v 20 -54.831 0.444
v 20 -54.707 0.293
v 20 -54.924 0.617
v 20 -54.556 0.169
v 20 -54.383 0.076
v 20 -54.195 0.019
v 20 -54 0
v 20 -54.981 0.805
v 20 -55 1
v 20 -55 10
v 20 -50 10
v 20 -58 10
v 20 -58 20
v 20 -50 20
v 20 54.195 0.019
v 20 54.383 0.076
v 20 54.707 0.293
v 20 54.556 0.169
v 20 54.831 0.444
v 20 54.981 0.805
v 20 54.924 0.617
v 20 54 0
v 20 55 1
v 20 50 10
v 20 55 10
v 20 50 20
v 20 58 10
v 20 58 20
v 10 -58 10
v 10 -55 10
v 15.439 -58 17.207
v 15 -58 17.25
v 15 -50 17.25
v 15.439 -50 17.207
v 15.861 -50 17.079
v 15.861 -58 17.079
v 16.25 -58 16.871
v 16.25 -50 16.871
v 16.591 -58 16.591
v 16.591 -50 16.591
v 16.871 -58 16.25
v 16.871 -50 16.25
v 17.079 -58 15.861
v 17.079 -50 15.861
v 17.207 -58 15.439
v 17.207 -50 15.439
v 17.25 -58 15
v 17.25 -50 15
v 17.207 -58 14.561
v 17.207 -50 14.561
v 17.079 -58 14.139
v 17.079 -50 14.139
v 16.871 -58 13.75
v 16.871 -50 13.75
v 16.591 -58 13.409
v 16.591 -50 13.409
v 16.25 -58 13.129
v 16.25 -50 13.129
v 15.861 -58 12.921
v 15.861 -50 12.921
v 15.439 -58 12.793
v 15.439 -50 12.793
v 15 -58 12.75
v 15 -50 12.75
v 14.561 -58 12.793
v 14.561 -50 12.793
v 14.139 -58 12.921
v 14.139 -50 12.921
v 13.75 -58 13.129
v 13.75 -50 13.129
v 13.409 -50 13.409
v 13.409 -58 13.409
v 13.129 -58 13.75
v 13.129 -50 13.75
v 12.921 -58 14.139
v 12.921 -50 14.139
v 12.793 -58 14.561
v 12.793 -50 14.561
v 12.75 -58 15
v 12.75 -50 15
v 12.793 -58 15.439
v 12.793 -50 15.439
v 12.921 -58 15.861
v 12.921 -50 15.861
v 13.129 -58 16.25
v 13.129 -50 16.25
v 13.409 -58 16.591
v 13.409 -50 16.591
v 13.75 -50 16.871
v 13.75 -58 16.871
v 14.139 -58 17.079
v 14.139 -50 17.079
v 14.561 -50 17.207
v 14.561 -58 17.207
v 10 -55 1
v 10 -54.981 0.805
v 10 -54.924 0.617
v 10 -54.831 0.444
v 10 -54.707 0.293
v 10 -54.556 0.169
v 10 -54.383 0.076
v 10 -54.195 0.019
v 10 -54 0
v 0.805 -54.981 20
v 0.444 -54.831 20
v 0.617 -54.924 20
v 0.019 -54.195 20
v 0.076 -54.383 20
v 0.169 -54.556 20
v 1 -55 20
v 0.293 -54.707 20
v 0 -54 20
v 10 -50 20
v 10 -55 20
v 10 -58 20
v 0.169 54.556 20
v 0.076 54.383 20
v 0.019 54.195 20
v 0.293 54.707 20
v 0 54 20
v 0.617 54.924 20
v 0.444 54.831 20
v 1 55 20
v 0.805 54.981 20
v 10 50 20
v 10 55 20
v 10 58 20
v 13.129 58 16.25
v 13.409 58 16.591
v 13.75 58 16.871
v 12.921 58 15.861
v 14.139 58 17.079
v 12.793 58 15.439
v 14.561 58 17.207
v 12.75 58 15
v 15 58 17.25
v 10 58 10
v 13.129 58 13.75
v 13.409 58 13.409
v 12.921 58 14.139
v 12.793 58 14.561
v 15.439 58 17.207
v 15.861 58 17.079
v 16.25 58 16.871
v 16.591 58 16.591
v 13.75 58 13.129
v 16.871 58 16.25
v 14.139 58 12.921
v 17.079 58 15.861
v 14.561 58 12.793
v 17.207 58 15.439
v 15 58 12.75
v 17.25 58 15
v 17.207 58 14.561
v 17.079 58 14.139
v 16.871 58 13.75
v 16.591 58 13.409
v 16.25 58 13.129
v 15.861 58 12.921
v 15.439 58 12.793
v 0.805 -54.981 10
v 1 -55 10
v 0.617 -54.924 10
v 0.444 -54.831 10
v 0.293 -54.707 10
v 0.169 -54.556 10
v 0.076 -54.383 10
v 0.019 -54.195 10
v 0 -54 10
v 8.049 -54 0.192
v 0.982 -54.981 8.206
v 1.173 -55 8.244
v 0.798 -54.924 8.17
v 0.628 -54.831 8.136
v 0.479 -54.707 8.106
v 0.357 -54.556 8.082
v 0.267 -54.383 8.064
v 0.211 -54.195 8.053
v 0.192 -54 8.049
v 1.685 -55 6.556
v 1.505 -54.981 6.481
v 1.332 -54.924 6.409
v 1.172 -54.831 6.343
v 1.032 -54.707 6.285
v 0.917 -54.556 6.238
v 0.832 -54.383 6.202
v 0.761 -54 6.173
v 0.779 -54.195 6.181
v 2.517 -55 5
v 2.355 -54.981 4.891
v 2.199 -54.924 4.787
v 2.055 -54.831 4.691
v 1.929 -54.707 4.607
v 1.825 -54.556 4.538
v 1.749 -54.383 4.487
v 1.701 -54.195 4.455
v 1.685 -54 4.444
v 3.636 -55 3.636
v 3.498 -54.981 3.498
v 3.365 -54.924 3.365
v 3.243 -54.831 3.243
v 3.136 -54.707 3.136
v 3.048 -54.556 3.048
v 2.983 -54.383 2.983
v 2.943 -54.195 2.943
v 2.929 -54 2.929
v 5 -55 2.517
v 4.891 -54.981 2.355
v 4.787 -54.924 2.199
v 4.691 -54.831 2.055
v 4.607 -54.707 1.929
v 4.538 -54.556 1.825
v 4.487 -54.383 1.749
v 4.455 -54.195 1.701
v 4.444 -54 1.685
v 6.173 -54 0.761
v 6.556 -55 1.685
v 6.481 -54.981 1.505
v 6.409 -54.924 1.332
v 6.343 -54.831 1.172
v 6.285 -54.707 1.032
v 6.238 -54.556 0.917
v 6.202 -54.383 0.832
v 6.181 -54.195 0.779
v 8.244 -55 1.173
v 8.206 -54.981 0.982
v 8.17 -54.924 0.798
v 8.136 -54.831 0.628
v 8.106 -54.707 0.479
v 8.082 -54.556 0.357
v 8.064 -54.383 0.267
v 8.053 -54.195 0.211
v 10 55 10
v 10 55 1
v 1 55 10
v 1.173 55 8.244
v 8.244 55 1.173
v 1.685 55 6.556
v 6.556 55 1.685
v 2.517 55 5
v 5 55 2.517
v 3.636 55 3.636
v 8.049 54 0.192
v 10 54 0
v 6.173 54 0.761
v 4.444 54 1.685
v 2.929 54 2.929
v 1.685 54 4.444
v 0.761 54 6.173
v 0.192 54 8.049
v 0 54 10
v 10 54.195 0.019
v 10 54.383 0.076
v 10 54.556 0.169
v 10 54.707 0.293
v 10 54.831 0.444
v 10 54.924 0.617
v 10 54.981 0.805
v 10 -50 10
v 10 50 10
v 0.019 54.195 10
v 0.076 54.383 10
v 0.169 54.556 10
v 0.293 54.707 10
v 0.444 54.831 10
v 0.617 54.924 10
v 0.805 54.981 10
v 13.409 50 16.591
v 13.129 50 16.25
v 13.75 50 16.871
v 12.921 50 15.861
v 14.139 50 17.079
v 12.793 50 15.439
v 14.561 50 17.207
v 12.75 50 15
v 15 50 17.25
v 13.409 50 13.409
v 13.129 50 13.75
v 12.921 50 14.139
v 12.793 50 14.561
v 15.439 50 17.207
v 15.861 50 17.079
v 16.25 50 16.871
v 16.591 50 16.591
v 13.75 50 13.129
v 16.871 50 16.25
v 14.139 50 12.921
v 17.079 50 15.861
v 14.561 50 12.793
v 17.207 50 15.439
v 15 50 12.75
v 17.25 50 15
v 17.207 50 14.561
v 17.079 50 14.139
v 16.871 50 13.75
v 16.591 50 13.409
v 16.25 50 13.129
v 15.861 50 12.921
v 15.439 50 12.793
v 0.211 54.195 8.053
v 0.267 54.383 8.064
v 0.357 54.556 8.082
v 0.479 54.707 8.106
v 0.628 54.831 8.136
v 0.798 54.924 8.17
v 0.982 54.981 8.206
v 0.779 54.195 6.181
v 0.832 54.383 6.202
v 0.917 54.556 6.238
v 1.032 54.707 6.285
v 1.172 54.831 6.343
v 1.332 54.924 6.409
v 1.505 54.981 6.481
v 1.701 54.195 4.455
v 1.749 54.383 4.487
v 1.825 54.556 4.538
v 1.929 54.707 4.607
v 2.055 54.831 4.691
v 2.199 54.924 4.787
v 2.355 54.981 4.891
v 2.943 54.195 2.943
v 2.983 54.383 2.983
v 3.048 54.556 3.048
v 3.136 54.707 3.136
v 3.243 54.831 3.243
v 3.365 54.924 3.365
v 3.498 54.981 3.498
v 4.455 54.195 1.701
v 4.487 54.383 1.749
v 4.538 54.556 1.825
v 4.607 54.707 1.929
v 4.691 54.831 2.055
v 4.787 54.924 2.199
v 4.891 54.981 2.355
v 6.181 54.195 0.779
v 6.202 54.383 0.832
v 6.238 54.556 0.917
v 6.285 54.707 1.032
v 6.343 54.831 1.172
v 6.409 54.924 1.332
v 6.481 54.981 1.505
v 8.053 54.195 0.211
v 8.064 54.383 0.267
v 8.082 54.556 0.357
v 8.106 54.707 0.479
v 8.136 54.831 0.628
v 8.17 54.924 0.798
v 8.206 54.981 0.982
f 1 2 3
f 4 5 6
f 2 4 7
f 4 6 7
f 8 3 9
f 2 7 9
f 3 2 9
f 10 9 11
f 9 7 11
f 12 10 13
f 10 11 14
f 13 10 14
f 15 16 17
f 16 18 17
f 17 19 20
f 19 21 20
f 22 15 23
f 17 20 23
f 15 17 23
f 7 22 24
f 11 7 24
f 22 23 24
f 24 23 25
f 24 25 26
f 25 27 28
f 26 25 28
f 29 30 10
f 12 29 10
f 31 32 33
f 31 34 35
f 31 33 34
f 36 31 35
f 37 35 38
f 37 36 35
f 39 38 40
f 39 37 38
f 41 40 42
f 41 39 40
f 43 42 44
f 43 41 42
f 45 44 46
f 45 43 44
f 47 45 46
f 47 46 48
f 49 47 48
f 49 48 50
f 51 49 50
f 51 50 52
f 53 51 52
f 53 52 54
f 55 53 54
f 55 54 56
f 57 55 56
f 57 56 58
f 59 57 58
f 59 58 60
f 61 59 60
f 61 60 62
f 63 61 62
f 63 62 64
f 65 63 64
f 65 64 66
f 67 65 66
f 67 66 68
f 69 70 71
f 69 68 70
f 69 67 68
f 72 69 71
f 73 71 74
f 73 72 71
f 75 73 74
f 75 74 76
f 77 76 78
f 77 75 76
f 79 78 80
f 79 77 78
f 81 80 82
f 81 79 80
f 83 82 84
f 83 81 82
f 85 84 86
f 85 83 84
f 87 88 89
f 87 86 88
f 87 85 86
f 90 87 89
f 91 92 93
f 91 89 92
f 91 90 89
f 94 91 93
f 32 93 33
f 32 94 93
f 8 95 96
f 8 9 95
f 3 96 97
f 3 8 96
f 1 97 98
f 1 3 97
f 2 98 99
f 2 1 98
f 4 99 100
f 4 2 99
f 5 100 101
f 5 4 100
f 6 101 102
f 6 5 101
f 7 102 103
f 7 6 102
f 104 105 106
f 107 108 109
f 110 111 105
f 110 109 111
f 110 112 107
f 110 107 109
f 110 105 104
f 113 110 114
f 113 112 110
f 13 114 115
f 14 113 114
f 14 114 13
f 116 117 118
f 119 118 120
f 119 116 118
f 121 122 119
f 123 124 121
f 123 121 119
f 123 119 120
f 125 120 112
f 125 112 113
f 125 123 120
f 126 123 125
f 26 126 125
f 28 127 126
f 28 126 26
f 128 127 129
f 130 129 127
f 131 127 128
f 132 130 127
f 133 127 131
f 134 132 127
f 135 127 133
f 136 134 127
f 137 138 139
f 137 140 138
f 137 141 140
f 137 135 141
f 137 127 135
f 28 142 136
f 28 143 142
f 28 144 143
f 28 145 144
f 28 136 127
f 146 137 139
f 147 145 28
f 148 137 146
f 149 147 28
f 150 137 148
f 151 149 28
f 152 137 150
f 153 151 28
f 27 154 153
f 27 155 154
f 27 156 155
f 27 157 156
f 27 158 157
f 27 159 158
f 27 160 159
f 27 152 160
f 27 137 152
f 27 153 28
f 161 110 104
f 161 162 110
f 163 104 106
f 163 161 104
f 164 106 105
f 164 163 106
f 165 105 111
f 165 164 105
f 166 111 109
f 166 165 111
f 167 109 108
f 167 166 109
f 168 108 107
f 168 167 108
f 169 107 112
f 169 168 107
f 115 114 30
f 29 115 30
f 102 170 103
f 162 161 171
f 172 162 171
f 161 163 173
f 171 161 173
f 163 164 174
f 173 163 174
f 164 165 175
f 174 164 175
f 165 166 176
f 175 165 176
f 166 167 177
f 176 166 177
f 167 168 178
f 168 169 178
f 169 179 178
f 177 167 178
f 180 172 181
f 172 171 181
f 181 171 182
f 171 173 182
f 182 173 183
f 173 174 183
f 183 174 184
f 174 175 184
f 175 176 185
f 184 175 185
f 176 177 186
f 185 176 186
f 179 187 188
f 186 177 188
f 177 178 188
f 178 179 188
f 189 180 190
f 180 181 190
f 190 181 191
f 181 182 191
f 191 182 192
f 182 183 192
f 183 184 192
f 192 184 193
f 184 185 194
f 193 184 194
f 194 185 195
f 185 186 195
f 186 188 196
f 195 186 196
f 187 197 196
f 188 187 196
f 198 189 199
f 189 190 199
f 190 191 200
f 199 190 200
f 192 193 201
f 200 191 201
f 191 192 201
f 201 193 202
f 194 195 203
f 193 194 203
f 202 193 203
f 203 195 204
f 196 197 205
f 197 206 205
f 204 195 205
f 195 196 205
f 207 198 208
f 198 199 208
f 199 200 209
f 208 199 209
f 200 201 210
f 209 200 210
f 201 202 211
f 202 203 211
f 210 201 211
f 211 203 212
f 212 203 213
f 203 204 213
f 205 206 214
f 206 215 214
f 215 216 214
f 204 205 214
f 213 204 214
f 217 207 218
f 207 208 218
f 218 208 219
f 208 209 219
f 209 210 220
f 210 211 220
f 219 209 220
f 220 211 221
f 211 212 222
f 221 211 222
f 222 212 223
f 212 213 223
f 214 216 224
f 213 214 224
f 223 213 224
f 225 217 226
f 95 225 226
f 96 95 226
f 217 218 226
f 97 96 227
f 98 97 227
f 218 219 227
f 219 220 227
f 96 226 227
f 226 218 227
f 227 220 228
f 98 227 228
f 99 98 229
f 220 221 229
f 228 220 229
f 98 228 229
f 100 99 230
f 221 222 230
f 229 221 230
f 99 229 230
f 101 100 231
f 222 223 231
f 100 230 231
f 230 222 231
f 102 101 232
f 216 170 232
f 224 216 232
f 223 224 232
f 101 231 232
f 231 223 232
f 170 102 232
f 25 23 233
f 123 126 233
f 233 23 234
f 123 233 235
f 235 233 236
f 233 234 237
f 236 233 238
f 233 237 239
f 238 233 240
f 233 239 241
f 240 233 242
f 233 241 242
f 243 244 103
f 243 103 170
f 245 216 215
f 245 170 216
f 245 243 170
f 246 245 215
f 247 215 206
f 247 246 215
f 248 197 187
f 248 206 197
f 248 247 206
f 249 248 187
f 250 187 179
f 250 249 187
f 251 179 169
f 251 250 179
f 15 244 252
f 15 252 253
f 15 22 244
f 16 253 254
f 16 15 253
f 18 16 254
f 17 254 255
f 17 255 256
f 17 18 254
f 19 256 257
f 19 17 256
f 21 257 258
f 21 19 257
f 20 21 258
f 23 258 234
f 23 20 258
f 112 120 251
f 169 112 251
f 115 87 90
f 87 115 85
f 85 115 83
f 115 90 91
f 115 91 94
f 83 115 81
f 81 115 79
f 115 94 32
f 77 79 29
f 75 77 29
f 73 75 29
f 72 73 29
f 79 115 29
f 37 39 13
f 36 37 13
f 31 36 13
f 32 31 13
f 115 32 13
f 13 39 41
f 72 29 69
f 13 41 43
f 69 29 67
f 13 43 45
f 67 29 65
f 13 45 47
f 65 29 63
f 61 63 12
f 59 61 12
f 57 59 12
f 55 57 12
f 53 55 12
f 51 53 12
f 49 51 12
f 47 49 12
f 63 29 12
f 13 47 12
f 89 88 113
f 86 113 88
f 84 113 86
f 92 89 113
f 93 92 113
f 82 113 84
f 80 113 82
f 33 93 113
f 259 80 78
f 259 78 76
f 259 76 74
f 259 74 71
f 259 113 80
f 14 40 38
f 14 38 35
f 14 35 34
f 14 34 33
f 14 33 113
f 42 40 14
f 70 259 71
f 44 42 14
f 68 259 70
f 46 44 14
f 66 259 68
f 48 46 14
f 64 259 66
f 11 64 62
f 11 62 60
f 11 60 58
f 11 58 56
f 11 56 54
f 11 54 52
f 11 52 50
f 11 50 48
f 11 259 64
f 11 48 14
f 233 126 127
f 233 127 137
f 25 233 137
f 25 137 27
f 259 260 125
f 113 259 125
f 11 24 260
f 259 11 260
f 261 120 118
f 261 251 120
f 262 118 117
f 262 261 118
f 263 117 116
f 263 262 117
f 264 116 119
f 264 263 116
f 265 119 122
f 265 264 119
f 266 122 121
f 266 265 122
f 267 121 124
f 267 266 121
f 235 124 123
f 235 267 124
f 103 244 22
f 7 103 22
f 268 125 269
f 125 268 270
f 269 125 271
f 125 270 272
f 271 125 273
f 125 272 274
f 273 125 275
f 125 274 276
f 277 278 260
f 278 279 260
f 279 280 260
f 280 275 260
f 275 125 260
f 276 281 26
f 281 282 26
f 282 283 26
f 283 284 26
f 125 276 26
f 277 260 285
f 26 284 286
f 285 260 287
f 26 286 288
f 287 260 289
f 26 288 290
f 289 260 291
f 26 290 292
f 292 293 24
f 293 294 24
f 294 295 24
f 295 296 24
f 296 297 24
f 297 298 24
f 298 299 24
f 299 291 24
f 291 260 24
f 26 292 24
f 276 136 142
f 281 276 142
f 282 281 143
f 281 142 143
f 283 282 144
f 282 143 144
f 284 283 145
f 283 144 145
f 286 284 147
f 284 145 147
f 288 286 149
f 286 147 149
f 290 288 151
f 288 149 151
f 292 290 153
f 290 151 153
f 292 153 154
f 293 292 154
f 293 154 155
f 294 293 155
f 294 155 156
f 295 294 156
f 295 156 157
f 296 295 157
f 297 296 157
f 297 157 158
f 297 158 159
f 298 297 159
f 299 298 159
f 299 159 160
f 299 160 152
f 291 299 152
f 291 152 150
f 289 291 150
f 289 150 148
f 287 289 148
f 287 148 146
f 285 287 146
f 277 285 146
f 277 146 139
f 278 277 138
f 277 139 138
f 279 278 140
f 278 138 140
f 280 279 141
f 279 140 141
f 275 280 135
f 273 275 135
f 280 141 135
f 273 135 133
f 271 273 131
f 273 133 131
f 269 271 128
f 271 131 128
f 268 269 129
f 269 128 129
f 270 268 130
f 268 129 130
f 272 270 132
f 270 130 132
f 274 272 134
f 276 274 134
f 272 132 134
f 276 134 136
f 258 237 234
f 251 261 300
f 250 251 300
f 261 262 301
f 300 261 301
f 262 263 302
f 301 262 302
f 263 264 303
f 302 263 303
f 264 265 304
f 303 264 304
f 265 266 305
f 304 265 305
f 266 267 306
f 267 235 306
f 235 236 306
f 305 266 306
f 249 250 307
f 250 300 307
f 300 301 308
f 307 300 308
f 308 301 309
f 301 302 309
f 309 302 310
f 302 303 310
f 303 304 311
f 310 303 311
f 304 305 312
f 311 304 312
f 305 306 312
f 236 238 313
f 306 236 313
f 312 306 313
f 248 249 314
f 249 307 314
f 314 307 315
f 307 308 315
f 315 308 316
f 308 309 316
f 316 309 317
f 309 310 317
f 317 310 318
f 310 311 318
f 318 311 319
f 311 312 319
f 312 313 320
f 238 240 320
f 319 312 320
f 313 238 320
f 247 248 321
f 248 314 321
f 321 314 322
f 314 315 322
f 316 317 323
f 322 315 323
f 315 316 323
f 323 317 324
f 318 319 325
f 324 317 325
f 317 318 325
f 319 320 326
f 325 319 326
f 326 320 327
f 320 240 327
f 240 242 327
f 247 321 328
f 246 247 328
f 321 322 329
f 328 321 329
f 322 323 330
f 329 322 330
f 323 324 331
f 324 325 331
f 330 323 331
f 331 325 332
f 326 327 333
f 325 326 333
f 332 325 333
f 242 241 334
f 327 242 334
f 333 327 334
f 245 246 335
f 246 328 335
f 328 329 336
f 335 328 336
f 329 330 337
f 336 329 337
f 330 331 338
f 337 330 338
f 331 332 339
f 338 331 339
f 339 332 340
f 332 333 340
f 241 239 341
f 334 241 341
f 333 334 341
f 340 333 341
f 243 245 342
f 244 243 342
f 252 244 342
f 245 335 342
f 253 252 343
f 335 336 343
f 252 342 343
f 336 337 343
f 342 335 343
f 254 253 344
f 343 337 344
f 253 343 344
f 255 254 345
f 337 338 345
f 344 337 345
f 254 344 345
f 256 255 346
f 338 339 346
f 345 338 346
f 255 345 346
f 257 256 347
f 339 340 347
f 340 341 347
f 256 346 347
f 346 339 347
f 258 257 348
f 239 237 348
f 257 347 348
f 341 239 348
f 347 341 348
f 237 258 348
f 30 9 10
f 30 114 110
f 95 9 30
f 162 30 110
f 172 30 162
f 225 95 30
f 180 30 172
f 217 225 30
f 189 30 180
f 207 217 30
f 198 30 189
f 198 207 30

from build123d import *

# Parameters (mm, degrees)
BOSS_EXTRUDE1_DEPTH  = 55
BOSS_EXTRUDE2_START  = -5
SKETCH3_W            = 10
SKETCH3_H            = 10
BOSS_EXTRUDE2_DEPTH  = 8
M4_CLEARANCE_HOLE1_D = 4.5
FILLET2_R            = 10
FILLET3_R            = 1


with BuildPart() as part:
    # Sketch2 → Boss-Extrude1 (new, symmetric)
    with BuildSketch(Plane(origin=(0, 0, 0), x_dir=(1, 0, 0), z_dir=(0, 1, 0))):
        Polygon((0, 0), (20, 0), (20, -10), (10, -10), (10, -20), (0, -20), align=None)
    extrude(amount=BOSS_EXTRUDE1_DEPTH, both=True)

    # Sketch3 → Boss-Extrude2 (add)
    with BuildSketch(Plane(origin=(0, 55, 0), x_dir=(1, 0, 0), z_dir=(0, 1, 0)).offset(BOSS_EXTRUDE2_START)):
        with Locations((15, -15)):
            Rectangle(SKETCH3_W, SKETCH3_H)
    boss_extrude2 = extrude(amount=BOSS_EXTRUDE2_DEPTH)

    # M4 Clearance Hole1 (through all)
    with Locations(Plane(origin=(15, 50, 15), x_dir=(0, 0, -1), z_dir=(0, -1, 0))):
        with Locations((0, 0)):
            m4_clearance_hole1 = Hole(M4_CLEARANCE_HOLE1_D / 2)

    # Mirror1: Boss-Extrude2, M4 Clearance Hole1 across plane
    add(boss_extrude2.mirror(Plane.ZX))
    add(m4_clearance_hole1.mirror(Plane.ZX), mode=Mode.SUBTRACT)

    # Fillet2
    fillet2_edges = [part.edges().sort_by_distance(p)[0] for p in [
        (0, 0, 0),
    ]]
    fillet(fillet2_edges, radius=FILLET2_R)

    # Fillet3
    fillet3_edges = [part.edges().sort_by_distance(p)[0] for p in [
        (15, 55, 0),
        (0, -55, 15),
        (0, 55, 15),
        (2.928932188, -55, 2.928932188),
        (2.928932188, 55, 2.928932188),
        (15, -55, 0),
    ]]
    fillet(fillet3_edges, radius=FILLET3_R)


solid = part.part
